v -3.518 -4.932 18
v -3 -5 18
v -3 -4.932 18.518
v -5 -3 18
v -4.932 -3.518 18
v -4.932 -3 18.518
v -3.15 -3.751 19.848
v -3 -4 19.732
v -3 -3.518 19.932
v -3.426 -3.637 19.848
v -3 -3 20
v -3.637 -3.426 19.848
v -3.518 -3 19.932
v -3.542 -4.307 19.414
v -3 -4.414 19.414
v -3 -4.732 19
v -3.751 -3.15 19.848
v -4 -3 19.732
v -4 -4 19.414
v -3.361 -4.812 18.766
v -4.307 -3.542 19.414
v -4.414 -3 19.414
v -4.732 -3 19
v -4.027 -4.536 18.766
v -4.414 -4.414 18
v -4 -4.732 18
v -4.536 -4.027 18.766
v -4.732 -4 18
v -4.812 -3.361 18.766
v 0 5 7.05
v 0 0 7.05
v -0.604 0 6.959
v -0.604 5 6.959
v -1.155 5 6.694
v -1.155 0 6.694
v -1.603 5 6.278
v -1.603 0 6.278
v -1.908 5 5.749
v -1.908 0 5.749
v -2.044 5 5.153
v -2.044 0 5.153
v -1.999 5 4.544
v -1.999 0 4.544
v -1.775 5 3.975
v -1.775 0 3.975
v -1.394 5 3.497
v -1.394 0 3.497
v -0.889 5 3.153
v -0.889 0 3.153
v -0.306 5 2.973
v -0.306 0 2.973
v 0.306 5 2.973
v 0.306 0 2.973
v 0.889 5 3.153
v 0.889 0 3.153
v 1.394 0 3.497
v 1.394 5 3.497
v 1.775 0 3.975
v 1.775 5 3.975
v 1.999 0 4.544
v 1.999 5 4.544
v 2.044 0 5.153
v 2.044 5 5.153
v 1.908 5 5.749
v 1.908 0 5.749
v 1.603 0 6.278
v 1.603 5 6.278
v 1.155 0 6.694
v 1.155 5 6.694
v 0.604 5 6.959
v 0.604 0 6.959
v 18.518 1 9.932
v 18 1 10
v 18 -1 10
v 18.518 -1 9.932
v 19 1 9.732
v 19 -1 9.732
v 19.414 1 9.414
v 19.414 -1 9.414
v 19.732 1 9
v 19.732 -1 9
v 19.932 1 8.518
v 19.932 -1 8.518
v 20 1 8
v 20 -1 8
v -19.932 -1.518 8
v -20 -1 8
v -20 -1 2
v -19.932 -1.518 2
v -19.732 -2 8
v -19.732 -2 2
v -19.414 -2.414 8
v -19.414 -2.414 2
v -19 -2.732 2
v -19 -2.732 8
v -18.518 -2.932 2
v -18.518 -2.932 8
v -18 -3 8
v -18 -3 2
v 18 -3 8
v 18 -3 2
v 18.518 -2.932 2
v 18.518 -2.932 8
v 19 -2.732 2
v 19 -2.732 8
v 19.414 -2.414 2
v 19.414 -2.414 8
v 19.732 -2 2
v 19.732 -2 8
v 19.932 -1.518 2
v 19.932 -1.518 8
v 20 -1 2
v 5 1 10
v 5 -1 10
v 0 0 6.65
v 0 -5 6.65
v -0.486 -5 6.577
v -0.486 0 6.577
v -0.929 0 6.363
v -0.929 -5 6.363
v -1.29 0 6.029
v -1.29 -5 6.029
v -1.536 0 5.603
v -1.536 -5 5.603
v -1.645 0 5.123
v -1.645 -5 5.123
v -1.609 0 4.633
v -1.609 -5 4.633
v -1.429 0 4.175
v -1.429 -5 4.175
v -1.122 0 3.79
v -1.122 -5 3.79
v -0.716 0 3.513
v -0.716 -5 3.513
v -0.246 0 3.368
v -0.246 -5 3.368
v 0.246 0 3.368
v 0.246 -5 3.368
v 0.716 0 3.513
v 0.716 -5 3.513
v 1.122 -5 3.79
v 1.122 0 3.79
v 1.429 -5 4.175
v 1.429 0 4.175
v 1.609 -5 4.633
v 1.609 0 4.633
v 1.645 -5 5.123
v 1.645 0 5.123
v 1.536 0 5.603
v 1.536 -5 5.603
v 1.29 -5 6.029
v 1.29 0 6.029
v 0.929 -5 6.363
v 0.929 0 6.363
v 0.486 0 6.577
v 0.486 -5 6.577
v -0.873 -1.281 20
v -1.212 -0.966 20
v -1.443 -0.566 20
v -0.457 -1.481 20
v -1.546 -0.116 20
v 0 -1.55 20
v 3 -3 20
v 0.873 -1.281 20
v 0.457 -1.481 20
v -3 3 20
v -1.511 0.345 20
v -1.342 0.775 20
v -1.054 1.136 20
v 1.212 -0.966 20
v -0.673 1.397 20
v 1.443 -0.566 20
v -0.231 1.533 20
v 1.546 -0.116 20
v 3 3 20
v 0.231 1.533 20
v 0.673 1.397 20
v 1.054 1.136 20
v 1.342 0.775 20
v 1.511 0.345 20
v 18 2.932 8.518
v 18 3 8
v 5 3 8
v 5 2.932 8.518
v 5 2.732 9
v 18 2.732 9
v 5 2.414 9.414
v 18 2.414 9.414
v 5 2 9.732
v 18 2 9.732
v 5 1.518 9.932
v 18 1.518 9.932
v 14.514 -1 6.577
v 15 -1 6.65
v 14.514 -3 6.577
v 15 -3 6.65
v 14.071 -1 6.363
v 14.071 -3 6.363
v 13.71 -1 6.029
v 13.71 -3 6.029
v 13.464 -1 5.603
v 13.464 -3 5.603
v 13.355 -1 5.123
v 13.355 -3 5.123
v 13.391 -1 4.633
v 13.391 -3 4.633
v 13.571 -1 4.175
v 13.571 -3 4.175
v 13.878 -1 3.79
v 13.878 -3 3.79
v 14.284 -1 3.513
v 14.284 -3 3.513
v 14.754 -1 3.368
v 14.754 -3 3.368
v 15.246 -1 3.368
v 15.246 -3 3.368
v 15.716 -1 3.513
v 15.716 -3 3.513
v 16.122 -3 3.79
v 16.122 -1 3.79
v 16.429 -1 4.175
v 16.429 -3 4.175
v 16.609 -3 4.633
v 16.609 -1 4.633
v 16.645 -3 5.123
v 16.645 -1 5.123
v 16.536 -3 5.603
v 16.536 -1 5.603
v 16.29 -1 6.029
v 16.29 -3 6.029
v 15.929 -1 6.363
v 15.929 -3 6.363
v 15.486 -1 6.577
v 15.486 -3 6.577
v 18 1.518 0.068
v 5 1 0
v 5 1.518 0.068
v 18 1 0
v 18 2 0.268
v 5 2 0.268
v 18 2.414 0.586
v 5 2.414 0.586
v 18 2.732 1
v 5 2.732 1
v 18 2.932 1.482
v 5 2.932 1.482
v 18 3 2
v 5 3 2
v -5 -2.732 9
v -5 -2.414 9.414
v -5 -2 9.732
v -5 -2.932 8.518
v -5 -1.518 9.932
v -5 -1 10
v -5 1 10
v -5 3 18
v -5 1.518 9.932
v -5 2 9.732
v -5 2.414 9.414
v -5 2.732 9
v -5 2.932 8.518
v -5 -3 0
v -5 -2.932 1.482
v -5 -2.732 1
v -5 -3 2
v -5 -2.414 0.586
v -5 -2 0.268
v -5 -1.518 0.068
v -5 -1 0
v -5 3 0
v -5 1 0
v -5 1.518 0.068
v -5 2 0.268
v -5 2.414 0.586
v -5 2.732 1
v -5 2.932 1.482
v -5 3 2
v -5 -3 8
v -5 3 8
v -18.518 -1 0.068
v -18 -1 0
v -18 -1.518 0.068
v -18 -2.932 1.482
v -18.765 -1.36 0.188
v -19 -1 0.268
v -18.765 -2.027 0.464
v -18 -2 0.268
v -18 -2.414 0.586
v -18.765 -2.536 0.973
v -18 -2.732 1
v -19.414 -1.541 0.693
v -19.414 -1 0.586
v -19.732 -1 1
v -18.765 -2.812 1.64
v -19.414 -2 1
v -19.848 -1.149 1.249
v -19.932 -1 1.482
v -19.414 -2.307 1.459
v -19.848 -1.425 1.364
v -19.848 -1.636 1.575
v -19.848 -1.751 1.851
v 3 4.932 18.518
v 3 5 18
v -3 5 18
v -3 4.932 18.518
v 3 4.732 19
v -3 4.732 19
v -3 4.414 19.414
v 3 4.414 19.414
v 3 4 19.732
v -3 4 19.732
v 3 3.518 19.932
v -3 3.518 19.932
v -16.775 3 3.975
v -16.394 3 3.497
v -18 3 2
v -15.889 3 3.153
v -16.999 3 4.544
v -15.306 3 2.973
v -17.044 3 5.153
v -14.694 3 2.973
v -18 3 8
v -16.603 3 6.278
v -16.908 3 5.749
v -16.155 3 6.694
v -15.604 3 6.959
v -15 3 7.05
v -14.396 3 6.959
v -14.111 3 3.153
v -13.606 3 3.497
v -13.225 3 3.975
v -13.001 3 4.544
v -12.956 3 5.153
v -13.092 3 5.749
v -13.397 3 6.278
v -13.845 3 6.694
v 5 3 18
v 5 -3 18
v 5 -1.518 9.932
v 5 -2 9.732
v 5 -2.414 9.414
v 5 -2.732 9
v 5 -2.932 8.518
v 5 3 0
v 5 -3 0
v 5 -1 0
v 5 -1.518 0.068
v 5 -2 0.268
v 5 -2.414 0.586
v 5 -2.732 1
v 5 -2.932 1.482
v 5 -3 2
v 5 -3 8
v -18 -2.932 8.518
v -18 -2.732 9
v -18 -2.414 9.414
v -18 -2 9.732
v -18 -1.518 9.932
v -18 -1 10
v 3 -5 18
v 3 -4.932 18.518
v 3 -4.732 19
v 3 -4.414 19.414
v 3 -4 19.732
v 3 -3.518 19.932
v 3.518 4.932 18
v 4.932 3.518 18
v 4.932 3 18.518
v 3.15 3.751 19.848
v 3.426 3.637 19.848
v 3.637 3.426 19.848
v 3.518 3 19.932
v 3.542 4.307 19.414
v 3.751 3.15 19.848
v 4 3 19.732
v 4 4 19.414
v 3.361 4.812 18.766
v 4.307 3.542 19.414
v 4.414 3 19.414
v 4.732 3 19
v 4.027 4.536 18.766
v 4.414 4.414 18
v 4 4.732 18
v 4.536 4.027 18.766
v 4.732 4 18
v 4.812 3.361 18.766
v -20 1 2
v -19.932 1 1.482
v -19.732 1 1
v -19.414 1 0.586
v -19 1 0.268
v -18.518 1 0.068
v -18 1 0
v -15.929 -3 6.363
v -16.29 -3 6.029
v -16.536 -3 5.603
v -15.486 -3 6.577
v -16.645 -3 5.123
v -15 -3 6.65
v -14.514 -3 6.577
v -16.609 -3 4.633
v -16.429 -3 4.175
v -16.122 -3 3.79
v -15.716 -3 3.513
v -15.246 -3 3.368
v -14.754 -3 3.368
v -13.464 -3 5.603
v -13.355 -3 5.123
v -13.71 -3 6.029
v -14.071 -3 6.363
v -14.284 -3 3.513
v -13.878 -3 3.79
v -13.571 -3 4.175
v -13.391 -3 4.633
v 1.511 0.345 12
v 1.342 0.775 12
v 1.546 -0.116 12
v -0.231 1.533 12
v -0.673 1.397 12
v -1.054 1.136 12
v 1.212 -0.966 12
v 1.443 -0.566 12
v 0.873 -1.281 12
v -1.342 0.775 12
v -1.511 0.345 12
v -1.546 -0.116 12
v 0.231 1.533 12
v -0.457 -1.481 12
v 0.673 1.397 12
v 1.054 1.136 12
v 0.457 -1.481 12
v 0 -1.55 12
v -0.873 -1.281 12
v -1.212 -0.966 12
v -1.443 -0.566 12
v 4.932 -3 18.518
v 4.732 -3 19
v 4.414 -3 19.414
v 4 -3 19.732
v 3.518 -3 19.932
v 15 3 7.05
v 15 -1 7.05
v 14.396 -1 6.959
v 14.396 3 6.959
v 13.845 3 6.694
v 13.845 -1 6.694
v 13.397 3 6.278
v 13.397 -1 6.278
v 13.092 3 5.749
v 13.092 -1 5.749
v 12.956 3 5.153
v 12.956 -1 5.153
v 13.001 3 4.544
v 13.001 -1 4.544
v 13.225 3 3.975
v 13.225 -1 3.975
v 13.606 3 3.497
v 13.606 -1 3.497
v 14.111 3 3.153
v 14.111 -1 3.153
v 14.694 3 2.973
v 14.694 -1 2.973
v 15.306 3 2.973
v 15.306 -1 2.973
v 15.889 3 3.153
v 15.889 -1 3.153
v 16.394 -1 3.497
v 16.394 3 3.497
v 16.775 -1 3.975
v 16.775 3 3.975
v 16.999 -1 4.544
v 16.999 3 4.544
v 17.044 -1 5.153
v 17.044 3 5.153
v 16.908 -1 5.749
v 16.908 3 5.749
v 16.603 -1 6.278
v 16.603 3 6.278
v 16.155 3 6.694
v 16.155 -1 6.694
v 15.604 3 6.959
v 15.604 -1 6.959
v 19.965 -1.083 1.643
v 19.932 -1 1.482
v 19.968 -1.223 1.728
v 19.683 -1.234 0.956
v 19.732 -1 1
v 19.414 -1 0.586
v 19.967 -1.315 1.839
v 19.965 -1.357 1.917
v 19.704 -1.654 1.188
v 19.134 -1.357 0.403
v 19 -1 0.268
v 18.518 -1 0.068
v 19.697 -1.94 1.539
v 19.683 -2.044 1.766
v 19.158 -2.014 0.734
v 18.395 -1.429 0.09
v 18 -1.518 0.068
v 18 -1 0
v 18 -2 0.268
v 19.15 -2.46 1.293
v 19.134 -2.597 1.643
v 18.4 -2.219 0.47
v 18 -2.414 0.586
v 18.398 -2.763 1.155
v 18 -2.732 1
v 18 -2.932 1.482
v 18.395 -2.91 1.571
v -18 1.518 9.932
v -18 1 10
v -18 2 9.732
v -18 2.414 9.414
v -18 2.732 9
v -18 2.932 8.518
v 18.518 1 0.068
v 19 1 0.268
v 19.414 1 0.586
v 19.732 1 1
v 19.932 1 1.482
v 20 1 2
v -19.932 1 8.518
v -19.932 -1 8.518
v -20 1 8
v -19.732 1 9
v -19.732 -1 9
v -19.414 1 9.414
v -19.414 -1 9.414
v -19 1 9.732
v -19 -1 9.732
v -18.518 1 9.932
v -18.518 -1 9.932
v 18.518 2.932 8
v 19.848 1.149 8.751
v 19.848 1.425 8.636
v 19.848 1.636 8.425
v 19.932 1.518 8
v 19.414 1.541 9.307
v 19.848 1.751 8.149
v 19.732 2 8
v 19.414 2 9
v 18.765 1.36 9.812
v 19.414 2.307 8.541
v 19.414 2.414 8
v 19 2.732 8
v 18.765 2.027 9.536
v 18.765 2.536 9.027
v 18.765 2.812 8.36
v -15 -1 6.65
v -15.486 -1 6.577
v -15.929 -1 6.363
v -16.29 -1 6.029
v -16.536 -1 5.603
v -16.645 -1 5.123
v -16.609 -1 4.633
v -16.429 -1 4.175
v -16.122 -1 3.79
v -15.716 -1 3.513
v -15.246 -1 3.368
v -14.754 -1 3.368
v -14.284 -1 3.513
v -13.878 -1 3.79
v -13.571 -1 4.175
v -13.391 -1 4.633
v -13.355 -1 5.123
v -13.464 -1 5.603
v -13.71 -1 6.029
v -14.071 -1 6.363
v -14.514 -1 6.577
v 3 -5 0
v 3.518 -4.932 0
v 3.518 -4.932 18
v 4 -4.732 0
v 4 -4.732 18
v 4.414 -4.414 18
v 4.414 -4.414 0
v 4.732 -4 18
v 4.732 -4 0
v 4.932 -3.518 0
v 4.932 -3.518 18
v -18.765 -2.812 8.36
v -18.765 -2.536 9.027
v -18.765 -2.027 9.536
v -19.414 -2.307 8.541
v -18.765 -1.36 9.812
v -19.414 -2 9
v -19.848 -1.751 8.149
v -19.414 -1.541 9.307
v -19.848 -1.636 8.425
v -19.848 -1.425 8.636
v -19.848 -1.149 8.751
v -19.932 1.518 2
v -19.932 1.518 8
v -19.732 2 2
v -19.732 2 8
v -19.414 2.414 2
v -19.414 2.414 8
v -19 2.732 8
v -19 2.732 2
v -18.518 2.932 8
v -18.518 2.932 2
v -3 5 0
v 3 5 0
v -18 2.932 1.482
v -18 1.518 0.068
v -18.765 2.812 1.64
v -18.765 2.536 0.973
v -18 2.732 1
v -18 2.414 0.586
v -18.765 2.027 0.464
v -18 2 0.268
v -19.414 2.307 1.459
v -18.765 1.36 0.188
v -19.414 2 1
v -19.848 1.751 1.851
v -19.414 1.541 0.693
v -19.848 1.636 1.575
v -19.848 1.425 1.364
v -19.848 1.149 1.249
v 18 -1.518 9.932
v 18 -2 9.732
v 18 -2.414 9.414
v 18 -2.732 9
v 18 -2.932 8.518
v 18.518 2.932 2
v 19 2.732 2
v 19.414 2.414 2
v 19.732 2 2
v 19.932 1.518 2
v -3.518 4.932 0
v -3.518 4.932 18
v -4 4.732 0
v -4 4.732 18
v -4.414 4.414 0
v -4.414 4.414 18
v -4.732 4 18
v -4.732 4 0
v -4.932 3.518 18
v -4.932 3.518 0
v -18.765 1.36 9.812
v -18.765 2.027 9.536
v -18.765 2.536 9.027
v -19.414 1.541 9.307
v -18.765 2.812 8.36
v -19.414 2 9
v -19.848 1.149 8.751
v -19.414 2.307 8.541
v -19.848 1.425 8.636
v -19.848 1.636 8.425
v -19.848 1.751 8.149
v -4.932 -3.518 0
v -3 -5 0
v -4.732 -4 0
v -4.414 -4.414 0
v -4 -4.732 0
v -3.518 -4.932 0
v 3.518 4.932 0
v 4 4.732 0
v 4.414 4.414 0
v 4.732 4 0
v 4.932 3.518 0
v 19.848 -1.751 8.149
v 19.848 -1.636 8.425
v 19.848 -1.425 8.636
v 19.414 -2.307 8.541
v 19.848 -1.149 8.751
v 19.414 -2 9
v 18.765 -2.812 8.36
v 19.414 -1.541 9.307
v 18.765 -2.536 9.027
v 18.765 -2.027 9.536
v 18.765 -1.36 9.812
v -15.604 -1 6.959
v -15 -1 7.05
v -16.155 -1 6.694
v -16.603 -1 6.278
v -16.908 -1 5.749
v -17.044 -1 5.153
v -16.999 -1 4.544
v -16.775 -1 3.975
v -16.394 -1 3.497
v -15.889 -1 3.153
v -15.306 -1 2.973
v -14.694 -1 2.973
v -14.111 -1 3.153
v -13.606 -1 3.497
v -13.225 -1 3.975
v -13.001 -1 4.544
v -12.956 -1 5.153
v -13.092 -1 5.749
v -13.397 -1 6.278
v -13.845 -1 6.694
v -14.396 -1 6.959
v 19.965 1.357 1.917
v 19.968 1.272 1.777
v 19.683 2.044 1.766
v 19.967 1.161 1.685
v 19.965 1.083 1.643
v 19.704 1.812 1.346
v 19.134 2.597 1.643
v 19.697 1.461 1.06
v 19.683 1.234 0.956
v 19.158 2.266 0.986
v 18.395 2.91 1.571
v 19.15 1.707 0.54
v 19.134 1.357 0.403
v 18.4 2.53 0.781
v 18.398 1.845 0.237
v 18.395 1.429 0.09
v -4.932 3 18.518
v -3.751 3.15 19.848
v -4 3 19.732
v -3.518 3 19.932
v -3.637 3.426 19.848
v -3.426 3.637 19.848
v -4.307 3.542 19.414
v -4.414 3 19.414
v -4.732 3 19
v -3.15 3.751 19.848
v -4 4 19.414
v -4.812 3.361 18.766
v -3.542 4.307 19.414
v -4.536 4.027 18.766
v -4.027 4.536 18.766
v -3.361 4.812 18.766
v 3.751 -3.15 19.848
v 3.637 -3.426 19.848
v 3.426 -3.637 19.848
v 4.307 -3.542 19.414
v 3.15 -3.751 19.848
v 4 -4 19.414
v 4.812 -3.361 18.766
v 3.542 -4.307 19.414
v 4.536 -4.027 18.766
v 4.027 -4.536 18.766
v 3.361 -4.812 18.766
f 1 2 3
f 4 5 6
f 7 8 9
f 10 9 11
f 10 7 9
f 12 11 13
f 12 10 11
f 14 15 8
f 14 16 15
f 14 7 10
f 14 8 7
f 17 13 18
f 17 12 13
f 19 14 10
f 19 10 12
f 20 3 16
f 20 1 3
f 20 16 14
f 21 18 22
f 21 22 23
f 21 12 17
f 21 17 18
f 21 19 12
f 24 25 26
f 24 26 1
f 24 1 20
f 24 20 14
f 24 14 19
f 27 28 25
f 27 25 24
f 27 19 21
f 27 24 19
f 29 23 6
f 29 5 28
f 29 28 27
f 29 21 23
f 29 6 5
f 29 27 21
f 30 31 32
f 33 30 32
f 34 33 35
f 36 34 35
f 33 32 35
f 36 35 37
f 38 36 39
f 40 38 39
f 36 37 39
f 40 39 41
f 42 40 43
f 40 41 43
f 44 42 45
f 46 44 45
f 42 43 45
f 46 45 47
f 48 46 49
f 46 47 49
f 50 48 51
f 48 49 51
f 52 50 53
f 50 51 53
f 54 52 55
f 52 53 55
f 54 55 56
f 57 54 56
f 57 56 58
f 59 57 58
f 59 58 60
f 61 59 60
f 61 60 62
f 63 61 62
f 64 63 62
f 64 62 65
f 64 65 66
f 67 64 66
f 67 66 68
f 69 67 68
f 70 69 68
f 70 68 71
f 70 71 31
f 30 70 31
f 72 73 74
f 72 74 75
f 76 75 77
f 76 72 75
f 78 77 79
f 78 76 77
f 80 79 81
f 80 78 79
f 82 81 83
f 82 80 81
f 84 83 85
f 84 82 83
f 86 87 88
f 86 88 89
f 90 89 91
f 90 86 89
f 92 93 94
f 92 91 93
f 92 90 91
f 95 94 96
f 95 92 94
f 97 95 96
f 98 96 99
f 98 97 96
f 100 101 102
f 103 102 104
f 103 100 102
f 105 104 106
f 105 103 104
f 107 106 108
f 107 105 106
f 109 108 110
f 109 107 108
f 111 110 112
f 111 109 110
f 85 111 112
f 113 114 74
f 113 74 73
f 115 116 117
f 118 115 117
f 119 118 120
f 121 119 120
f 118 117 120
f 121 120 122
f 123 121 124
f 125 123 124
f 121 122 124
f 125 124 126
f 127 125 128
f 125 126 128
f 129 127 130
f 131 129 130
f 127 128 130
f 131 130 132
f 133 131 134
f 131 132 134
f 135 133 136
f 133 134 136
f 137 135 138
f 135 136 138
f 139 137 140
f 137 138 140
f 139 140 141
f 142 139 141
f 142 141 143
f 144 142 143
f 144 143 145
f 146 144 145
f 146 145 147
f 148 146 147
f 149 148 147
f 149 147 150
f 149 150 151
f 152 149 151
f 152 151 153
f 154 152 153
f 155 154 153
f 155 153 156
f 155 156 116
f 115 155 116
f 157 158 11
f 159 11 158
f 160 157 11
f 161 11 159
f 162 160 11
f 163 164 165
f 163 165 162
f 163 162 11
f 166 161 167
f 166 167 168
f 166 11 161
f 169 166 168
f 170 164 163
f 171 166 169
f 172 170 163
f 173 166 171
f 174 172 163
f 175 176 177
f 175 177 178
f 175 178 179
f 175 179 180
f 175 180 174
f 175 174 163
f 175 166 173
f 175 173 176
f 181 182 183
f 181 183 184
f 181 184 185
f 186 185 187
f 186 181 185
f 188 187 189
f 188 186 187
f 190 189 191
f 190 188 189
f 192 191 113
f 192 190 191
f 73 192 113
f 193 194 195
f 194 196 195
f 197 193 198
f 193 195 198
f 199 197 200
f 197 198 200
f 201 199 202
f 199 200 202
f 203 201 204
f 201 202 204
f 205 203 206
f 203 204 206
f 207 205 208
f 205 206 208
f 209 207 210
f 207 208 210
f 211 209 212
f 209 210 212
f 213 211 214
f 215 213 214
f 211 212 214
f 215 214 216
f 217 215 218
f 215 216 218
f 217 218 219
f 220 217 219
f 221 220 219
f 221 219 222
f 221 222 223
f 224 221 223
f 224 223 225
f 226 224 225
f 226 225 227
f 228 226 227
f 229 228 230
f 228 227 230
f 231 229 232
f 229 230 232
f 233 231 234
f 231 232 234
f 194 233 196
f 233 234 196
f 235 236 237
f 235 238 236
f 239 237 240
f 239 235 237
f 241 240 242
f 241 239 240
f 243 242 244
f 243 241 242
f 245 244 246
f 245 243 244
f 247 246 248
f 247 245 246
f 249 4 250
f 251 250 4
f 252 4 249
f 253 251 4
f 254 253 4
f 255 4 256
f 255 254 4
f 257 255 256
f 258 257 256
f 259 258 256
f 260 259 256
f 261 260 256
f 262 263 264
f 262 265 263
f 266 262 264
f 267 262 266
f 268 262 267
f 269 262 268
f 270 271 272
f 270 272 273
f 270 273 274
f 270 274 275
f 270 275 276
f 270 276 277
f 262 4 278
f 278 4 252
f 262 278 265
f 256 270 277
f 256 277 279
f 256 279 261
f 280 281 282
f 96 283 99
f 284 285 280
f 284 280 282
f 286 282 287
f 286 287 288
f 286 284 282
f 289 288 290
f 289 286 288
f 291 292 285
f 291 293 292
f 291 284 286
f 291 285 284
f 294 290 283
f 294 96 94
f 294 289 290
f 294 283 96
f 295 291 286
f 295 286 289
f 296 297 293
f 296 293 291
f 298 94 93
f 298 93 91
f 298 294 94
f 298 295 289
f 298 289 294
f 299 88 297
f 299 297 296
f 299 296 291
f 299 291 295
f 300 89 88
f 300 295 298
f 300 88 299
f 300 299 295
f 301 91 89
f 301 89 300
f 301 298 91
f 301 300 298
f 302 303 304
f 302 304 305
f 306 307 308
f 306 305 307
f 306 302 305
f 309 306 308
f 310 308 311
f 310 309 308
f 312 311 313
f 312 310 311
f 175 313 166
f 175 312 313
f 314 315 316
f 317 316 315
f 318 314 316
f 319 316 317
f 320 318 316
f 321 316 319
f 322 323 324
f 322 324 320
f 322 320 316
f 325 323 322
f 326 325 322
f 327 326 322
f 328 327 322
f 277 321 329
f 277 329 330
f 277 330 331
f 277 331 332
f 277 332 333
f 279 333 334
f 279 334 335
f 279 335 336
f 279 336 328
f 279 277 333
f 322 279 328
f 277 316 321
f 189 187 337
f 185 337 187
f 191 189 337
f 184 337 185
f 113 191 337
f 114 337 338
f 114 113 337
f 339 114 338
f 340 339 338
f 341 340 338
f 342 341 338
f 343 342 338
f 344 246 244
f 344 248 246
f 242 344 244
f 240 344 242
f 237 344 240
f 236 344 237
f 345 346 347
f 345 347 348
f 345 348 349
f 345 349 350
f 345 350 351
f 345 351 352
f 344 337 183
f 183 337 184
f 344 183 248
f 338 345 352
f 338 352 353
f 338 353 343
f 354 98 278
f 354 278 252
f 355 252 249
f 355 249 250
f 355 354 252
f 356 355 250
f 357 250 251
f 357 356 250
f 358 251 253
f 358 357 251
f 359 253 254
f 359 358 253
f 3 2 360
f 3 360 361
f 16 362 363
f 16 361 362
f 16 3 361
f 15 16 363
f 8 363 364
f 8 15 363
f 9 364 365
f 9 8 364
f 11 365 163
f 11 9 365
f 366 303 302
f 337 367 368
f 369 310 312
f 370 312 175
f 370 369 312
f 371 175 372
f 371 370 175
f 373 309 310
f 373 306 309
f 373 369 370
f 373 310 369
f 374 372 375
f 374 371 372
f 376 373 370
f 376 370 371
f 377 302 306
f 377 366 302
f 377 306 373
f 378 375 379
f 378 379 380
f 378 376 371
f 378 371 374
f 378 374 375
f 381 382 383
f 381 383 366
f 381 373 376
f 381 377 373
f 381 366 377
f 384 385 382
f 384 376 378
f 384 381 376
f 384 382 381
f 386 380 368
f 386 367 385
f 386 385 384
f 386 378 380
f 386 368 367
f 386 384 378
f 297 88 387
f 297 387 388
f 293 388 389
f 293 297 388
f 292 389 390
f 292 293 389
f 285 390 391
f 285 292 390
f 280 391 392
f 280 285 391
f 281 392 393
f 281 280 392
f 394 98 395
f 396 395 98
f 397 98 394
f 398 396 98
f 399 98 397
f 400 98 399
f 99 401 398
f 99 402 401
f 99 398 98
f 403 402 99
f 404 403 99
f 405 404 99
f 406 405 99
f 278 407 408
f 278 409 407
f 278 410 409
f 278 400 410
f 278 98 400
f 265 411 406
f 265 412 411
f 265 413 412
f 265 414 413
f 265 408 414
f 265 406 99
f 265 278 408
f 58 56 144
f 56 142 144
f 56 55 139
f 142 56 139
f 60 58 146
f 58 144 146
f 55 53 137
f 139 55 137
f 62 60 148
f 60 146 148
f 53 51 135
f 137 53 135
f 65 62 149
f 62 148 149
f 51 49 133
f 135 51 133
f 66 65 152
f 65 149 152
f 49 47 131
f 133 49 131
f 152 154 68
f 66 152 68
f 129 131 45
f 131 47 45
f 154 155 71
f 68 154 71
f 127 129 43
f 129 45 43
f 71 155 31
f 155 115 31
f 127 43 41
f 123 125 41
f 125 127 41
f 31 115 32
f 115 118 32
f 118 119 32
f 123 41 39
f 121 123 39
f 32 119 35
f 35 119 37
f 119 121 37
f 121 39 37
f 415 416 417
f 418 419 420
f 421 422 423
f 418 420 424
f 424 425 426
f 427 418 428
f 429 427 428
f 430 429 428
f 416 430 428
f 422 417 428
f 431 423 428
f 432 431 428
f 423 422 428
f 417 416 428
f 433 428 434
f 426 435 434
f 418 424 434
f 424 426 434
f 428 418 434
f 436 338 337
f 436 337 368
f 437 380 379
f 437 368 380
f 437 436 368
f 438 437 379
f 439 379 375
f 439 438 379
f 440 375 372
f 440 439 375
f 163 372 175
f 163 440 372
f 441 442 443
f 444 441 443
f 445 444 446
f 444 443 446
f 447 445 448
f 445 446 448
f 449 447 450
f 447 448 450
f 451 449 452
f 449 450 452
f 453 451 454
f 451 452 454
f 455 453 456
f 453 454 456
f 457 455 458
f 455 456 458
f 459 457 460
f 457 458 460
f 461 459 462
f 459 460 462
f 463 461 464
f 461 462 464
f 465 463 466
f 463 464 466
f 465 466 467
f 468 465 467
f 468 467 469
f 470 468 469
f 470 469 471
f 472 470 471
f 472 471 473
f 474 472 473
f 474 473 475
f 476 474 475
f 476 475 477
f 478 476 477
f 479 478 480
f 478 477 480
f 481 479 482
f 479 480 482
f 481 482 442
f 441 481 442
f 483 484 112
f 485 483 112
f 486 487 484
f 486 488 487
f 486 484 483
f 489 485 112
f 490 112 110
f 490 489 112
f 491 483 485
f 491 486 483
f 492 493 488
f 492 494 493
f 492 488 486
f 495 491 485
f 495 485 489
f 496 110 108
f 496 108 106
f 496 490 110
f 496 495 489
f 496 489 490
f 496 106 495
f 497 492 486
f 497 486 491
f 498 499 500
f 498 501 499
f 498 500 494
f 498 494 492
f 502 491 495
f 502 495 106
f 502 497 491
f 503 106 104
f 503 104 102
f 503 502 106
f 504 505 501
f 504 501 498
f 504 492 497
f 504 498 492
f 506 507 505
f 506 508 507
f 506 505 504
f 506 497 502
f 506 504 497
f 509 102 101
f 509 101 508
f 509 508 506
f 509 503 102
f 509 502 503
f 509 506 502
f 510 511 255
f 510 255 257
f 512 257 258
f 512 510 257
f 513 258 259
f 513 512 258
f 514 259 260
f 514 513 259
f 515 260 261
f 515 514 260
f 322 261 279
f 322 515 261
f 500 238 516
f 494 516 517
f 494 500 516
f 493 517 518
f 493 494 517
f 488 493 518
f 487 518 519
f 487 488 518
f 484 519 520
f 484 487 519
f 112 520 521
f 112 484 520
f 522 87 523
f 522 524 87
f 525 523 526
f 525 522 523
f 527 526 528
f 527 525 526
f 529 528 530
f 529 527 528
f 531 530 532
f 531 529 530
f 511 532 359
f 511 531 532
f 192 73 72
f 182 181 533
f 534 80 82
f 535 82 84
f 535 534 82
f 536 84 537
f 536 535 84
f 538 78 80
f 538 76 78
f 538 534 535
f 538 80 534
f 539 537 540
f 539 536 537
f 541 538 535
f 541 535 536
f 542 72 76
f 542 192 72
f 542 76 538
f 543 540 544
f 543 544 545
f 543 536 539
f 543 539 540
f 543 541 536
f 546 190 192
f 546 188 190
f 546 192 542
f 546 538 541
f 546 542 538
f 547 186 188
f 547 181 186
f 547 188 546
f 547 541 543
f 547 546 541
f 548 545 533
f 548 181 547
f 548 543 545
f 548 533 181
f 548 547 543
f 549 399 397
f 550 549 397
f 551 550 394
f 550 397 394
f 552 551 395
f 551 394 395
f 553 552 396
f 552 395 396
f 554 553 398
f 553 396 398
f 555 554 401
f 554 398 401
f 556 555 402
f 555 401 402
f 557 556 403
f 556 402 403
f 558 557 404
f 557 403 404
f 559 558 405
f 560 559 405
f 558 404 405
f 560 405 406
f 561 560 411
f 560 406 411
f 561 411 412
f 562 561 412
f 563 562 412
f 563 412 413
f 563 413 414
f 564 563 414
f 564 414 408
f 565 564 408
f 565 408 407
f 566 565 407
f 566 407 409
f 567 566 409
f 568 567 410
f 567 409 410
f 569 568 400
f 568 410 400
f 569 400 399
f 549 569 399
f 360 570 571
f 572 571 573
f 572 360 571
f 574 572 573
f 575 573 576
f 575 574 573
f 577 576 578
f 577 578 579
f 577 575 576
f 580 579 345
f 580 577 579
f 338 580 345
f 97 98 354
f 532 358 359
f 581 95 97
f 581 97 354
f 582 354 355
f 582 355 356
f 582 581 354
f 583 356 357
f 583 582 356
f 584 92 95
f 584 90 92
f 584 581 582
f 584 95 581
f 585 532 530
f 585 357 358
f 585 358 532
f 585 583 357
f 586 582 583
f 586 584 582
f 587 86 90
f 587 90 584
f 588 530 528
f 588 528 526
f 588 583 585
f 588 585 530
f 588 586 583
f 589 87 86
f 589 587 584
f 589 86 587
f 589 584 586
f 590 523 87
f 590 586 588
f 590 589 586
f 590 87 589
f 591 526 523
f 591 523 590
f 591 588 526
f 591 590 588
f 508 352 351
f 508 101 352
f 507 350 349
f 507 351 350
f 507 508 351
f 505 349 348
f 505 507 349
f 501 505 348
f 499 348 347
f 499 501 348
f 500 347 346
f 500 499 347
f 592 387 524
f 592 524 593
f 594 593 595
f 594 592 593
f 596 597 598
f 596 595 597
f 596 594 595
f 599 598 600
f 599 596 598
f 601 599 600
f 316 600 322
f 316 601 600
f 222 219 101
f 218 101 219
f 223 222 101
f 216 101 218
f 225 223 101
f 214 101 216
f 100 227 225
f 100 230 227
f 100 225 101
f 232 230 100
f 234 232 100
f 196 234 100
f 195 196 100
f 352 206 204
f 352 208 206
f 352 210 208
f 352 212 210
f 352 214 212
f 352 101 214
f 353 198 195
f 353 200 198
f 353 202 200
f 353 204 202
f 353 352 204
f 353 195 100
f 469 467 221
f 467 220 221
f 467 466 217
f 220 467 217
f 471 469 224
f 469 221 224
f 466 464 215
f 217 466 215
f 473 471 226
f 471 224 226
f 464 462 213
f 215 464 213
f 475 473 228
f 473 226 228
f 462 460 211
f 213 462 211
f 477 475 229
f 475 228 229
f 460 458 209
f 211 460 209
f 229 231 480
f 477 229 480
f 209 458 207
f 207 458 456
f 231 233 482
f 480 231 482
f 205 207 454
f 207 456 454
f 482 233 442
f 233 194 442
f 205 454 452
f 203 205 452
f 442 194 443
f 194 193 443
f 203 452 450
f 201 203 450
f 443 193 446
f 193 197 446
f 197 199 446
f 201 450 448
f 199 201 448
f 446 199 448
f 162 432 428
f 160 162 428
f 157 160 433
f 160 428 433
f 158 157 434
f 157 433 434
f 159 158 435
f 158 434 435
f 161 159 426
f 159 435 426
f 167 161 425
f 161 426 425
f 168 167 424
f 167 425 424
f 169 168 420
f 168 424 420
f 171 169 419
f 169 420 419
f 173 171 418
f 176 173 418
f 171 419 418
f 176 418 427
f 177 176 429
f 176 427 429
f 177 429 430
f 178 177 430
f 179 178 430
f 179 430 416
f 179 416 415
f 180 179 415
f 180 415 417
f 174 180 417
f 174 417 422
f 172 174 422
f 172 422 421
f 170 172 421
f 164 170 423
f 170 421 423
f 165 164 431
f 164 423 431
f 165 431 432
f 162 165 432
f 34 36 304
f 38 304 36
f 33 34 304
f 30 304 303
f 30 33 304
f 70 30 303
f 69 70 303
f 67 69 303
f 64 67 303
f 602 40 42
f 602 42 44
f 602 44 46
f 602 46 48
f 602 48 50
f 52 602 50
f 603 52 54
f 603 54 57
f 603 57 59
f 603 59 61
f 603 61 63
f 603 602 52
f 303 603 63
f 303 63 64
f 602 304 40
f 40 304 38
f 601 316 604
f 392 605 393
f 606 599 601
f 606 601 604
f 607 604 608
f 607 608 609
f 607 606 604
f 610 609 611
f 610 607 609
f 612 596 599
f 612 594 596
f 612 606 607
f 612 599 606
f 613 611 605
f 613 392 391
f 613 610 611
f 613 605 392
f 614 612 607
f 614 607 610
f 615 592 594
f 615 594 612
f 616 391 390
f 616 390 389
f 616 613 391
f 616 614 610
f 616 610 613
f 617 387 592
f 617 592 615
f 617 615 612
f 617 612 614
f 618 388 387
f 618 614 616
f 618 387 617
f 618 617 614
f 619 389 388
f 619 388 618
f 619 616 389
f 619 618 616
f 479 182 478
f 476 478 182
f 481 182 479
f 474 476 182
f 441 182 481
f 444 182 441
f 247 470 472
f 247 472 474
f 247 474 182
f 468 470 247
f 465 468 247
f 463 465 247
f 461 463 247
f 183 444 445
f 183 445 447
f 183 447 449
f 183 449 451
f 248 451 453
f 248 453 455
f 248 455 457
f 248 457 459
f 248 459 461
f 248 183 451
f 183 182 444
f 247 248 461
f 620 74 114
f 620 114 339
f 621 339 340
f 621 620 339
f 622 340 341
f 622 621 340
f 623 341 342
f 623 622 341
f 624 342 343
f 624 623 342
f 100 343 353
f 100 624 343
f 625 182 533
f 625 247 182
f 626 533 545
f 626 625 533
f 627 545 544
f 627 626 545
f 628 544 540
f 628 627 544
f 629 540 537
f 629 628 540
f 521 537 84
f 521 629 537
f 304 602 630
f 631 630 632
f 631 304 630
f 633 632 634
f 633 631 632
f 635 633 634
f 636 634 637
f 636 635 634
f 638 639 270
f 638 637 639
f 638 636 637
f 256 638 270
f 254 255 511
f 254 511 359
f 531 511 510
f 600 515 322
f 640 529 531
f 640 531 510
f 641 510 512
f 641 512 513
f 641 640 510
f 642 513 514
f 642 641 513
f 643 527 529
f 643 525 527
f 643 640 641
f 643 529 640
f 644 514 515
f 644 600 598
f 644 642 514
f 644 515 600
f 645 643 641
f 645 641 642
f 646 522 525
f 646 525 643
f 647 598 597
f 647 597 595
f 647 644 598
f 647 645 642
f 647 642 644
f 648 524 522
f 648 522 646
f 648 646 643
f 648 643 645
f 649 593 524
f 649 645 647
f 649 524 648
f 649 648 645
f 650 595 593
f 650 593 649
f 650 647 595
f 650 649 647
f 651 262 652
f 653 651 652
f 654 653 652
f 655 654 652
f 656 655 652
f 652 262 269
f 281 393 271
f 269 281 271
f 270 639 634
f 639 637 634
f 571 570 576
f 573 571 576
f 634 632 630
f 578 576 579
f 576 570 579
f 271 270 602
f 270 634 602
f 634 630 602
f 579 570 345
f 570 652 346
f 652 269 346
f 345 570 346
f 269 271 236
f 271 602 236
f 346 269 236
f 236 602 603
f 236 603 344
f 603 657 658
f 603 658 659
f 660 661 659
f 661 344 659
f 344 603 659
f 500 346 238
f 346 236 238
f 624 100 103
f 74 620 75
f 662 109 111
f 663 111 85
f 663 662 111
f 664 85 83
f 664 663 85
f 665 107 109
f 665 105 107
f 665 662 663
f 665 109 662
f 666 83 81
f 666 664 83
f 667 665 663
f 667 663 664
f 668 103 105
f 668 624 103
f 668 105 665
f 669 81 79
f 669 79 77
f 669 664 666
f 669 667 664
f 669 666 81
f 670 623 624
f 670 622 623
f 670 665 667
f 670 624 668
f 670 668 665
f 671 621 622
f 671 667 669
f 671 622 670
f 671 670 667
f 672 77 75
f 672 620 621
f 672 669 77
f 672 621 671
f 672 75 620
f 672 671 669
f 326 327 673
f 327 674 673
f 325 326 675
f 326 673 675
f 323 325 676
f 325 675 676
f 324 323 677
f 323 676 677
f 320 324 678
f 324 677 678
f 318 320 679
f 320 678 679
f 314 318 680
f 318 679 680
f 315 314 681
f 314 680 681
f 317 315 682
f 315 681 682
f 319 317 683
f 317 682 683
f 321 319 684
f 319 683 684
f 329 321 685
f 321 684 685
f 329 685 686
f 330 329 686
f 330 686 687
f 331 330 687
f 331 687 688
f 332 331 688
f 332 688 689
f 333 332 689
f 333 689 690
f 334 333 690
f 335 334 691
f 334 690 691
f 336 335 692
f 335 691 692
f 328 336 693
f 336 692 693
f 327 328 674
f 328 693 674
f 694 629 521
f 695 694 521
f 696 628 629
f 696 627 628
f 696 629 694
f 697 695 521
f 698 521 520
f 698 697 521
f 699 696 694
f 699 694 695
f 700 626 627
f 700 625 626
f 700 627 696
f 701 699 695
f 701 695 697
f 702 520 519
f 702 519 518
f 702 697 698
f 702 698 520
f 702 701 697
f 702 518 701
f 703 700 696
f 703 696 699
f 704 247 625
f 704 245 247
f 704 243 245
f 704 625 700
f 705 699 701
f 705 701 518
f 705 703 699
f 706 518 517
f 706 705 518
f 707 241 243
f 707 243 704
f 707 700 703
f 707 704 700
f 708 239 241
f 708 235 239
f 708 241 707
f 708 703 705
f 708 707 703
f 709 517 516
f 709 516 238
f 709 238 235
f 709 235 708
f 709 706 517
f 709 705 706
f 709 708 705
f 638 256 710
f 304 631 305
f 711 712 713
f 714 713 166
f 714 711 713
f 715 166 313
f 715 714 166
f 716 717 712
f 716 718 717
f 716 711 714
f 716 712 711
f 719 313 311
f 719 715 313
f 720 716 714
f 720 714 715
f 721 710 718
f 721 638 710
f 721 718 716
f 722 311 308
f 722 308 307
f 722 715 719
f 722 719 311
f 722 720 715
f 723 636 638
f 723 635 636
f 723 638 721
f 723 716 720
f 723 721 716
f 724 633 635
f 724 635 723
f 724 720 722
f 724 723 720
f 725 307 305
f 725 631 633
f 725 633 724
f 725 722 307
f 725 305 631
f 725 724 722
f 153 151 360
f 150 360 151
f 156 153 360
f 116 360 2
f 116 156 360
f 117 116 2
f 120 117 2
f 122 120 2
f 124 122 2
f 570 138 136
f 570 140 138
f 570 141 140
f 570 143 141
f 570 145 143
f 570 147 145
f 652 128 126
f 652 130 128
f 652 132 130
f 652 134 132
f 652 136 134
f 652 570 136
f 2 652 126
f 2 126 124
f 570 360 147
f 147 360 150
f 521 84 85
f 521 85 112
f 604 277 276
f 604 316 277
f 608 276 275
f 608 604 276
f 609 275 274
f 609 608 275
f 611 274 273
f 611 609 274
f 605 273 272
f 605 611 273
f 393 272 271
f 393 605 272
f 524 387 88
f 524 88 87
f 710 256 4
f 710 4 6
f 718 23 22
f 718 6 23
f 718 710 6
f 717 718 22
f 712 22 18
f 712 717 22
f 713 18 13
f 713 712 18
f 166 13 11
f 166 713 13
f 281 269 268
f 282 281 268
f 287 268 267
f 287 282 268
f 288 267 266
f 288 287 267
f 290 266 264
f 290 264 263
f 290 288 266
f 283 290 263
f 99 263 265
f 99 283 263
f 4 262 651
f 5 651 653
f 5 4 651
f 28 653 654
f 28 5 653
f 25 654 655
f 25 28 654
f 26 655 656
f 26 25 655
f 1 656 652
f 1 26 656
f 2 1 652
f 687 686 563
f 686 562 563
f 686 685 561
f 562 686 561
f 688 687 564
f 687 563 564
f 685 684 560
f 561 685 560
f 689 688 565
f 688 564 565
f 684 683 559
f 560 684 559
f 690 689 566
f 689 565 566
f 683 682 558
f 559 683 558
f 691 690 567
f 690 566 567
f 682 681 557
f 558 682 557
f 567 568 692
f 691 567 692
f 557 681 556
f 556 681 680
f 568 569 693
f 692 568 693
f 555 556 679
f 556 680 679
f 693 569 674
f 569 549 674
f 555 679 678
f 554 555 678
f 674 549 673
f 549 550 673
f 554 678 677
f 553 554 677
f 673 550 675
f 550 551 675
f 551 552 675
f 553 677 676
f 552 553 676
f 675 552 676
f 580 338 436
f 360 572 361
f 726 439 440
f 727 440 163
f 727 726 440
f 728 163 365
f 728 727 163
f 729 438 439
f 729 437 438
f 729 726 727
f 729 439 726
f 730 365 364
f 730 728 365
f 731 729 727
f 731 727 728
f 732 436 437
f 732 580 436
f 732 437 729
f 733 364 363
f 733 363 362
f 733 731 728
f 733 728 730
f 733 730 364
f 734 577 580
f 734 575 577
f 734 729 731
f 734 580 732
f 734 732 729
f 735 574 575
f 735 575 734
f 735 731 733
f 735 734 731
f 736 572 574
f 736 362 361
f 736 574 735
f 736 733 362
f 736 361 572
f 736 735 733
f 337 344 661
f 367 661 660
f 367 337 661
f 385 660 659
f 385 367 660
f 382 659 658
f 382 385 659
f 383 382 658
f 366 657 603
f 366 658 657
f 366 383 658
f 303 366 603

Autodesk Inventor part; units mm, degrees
ref_plane "YZ Plane" through (0, 0, 0) normal (1, 0, 0) x (0, 1, 0)
sketch "Sketch6" plane through (0, 0, 0) normal (0, 0, 1) x (1, 0, 0)
  line L0 (-5, 5) -> (5, 5)
  line L1 (5, 5) -> (5, -5)
  line L2 (5, -5) -> (-5, -5)
  line L3 (-5, -5) -> (-5, 5)
  point P0 (0, 0)
  dimension "d31" = 10
  dimension "d32" = 10
  dimension "d33" = 5
  dimension "d34" = 5
extrude "Extrusion3" add sketch "Sketch6" along normal blind 20
sketch "Sketch7" plane through (0, 0, 20) normal (0, 0, 1) x (1, 0, 0)
  point P0 (0, 0)
  point P1 (0, 0)
hole "Hole4" at (0, 0, 20) direction (0, 0, -1) diameter 3.1 depth 8
sketch "Sketch8" plane through (-5, 5, 0) normal (0, 1, 0) x (1, 0, 0)
  point P0 (5, 0)
  point P1 (5, -5)
  dimension "d44" = 5
hole "Hole5" at (0, 5, 5) direction (0, -1, 0) diameter 3.3 end through all counterbore diameter 4.1 counterbore depth 5
sketch "Sketch9" plane through (5, -5, 0) normal (1, 0, 0) x (0, 0, -1)
  line L0 (0, 10) -> (-20, 10) construction
  line L1 (-10, 10) -> (-10, 0) construction
  line L2 (0, 0) -> (-20, 0) construction
  line L3 (0, 0) -> (0, 10) projected
  line L4 (-10, 8) -> (0, 8)
  line L5 (0, 8) -> (0, 2)
  line L6 (0, 2) -> (-10, 2)
  line L7 (-10, 2) -> (-10, 8)
  line L8 (0, 5) -> (-20, 5)
  line L9 (-20, 10) -> (-20, 0) projected
  dimension "d52" = 6
extrude "Extrusion4" add sketch "Sketch9" along normal blind 15
ref_plane "Work Plane2" through (5, 3, 2) normal (0, 1, 0) x (1, 0, 0)
ref_plane "Work Plane1" through (0, -3, 18) normal (1, 0, 0) x (0, 0, -1)
mirror "Mirror1" about plane through (0, -3, 18) normal (1, 0, 0) of "Extrusion4"
fillet "Fillet3" radius 2 6 edges at (-12.5, 3, 0) (-12.5, 3, 10) (12.5, 3, 10) (-12.5, -3, 10) (12.5, -3, 10) (-12.5, -3, 0)
fillet "Fillet4" radius 2 10 edges at (12.5, 3, 0) (12.5, -3, 0) (5, 5, 10) (-5, 5, 10) (-5, -5, 10) (5, -5, 10) (-5, 0, 20) (5, 0, 20) (0, 5, 20) (0, -5, 20)
fillet "Fillet5" radius 2 14 edges at (20, -2.4144, 0.5856) (20, -3, 4.9997) (20, 0, 0) (20, 2.4144, 0.5856) (20, 3, 4.9997) (20, 0, 10) (-20, 0, 10) (-20, -2.4142, 9.4142) (-20, -3, 5) (-20, -2.4142, 0.5858) (-20, 0, 0) (-20, 2.4142, 0.5858) (-20, 3, 5) (-20, 2.4142, 9.4142)
sketch "Sketch11" plane through (-3, -5, 0) normal (0, -1, 0) x (1, 0, 0)
  circle A0 centre (3, 5) radius 1.65 projected
  point P0 (3, 0)
sketch "Sketch12" plane through (5, 3, 8) normal (0, 1, 0) x (1, 0, 0)
  line L0 (0, 6) -> (0, 0) construction
  line L1 (0, 3) -> (15, 3) construction
  line L2 (15, 0) -> (15, 6) construction
  line L3 (-10, 0) -> (-10, 6) construction
  line L4 (-10, 3) -> (-25, 3) construction
  line L5 (-25, 6) -> (-25, 0) construction
  point P0 (-5, 8)
  point P1 (10, 3)
  point P2 (-20, 3)
  dimension "d67" = 5
  dimension "d68" = 5
hole "Hole7" at (15, 3, 5) at (-15, 3, 5) direction (0, -1, 0) diameter 3.3 end through all counterbore diameter 4.1 counterbore depth 4
